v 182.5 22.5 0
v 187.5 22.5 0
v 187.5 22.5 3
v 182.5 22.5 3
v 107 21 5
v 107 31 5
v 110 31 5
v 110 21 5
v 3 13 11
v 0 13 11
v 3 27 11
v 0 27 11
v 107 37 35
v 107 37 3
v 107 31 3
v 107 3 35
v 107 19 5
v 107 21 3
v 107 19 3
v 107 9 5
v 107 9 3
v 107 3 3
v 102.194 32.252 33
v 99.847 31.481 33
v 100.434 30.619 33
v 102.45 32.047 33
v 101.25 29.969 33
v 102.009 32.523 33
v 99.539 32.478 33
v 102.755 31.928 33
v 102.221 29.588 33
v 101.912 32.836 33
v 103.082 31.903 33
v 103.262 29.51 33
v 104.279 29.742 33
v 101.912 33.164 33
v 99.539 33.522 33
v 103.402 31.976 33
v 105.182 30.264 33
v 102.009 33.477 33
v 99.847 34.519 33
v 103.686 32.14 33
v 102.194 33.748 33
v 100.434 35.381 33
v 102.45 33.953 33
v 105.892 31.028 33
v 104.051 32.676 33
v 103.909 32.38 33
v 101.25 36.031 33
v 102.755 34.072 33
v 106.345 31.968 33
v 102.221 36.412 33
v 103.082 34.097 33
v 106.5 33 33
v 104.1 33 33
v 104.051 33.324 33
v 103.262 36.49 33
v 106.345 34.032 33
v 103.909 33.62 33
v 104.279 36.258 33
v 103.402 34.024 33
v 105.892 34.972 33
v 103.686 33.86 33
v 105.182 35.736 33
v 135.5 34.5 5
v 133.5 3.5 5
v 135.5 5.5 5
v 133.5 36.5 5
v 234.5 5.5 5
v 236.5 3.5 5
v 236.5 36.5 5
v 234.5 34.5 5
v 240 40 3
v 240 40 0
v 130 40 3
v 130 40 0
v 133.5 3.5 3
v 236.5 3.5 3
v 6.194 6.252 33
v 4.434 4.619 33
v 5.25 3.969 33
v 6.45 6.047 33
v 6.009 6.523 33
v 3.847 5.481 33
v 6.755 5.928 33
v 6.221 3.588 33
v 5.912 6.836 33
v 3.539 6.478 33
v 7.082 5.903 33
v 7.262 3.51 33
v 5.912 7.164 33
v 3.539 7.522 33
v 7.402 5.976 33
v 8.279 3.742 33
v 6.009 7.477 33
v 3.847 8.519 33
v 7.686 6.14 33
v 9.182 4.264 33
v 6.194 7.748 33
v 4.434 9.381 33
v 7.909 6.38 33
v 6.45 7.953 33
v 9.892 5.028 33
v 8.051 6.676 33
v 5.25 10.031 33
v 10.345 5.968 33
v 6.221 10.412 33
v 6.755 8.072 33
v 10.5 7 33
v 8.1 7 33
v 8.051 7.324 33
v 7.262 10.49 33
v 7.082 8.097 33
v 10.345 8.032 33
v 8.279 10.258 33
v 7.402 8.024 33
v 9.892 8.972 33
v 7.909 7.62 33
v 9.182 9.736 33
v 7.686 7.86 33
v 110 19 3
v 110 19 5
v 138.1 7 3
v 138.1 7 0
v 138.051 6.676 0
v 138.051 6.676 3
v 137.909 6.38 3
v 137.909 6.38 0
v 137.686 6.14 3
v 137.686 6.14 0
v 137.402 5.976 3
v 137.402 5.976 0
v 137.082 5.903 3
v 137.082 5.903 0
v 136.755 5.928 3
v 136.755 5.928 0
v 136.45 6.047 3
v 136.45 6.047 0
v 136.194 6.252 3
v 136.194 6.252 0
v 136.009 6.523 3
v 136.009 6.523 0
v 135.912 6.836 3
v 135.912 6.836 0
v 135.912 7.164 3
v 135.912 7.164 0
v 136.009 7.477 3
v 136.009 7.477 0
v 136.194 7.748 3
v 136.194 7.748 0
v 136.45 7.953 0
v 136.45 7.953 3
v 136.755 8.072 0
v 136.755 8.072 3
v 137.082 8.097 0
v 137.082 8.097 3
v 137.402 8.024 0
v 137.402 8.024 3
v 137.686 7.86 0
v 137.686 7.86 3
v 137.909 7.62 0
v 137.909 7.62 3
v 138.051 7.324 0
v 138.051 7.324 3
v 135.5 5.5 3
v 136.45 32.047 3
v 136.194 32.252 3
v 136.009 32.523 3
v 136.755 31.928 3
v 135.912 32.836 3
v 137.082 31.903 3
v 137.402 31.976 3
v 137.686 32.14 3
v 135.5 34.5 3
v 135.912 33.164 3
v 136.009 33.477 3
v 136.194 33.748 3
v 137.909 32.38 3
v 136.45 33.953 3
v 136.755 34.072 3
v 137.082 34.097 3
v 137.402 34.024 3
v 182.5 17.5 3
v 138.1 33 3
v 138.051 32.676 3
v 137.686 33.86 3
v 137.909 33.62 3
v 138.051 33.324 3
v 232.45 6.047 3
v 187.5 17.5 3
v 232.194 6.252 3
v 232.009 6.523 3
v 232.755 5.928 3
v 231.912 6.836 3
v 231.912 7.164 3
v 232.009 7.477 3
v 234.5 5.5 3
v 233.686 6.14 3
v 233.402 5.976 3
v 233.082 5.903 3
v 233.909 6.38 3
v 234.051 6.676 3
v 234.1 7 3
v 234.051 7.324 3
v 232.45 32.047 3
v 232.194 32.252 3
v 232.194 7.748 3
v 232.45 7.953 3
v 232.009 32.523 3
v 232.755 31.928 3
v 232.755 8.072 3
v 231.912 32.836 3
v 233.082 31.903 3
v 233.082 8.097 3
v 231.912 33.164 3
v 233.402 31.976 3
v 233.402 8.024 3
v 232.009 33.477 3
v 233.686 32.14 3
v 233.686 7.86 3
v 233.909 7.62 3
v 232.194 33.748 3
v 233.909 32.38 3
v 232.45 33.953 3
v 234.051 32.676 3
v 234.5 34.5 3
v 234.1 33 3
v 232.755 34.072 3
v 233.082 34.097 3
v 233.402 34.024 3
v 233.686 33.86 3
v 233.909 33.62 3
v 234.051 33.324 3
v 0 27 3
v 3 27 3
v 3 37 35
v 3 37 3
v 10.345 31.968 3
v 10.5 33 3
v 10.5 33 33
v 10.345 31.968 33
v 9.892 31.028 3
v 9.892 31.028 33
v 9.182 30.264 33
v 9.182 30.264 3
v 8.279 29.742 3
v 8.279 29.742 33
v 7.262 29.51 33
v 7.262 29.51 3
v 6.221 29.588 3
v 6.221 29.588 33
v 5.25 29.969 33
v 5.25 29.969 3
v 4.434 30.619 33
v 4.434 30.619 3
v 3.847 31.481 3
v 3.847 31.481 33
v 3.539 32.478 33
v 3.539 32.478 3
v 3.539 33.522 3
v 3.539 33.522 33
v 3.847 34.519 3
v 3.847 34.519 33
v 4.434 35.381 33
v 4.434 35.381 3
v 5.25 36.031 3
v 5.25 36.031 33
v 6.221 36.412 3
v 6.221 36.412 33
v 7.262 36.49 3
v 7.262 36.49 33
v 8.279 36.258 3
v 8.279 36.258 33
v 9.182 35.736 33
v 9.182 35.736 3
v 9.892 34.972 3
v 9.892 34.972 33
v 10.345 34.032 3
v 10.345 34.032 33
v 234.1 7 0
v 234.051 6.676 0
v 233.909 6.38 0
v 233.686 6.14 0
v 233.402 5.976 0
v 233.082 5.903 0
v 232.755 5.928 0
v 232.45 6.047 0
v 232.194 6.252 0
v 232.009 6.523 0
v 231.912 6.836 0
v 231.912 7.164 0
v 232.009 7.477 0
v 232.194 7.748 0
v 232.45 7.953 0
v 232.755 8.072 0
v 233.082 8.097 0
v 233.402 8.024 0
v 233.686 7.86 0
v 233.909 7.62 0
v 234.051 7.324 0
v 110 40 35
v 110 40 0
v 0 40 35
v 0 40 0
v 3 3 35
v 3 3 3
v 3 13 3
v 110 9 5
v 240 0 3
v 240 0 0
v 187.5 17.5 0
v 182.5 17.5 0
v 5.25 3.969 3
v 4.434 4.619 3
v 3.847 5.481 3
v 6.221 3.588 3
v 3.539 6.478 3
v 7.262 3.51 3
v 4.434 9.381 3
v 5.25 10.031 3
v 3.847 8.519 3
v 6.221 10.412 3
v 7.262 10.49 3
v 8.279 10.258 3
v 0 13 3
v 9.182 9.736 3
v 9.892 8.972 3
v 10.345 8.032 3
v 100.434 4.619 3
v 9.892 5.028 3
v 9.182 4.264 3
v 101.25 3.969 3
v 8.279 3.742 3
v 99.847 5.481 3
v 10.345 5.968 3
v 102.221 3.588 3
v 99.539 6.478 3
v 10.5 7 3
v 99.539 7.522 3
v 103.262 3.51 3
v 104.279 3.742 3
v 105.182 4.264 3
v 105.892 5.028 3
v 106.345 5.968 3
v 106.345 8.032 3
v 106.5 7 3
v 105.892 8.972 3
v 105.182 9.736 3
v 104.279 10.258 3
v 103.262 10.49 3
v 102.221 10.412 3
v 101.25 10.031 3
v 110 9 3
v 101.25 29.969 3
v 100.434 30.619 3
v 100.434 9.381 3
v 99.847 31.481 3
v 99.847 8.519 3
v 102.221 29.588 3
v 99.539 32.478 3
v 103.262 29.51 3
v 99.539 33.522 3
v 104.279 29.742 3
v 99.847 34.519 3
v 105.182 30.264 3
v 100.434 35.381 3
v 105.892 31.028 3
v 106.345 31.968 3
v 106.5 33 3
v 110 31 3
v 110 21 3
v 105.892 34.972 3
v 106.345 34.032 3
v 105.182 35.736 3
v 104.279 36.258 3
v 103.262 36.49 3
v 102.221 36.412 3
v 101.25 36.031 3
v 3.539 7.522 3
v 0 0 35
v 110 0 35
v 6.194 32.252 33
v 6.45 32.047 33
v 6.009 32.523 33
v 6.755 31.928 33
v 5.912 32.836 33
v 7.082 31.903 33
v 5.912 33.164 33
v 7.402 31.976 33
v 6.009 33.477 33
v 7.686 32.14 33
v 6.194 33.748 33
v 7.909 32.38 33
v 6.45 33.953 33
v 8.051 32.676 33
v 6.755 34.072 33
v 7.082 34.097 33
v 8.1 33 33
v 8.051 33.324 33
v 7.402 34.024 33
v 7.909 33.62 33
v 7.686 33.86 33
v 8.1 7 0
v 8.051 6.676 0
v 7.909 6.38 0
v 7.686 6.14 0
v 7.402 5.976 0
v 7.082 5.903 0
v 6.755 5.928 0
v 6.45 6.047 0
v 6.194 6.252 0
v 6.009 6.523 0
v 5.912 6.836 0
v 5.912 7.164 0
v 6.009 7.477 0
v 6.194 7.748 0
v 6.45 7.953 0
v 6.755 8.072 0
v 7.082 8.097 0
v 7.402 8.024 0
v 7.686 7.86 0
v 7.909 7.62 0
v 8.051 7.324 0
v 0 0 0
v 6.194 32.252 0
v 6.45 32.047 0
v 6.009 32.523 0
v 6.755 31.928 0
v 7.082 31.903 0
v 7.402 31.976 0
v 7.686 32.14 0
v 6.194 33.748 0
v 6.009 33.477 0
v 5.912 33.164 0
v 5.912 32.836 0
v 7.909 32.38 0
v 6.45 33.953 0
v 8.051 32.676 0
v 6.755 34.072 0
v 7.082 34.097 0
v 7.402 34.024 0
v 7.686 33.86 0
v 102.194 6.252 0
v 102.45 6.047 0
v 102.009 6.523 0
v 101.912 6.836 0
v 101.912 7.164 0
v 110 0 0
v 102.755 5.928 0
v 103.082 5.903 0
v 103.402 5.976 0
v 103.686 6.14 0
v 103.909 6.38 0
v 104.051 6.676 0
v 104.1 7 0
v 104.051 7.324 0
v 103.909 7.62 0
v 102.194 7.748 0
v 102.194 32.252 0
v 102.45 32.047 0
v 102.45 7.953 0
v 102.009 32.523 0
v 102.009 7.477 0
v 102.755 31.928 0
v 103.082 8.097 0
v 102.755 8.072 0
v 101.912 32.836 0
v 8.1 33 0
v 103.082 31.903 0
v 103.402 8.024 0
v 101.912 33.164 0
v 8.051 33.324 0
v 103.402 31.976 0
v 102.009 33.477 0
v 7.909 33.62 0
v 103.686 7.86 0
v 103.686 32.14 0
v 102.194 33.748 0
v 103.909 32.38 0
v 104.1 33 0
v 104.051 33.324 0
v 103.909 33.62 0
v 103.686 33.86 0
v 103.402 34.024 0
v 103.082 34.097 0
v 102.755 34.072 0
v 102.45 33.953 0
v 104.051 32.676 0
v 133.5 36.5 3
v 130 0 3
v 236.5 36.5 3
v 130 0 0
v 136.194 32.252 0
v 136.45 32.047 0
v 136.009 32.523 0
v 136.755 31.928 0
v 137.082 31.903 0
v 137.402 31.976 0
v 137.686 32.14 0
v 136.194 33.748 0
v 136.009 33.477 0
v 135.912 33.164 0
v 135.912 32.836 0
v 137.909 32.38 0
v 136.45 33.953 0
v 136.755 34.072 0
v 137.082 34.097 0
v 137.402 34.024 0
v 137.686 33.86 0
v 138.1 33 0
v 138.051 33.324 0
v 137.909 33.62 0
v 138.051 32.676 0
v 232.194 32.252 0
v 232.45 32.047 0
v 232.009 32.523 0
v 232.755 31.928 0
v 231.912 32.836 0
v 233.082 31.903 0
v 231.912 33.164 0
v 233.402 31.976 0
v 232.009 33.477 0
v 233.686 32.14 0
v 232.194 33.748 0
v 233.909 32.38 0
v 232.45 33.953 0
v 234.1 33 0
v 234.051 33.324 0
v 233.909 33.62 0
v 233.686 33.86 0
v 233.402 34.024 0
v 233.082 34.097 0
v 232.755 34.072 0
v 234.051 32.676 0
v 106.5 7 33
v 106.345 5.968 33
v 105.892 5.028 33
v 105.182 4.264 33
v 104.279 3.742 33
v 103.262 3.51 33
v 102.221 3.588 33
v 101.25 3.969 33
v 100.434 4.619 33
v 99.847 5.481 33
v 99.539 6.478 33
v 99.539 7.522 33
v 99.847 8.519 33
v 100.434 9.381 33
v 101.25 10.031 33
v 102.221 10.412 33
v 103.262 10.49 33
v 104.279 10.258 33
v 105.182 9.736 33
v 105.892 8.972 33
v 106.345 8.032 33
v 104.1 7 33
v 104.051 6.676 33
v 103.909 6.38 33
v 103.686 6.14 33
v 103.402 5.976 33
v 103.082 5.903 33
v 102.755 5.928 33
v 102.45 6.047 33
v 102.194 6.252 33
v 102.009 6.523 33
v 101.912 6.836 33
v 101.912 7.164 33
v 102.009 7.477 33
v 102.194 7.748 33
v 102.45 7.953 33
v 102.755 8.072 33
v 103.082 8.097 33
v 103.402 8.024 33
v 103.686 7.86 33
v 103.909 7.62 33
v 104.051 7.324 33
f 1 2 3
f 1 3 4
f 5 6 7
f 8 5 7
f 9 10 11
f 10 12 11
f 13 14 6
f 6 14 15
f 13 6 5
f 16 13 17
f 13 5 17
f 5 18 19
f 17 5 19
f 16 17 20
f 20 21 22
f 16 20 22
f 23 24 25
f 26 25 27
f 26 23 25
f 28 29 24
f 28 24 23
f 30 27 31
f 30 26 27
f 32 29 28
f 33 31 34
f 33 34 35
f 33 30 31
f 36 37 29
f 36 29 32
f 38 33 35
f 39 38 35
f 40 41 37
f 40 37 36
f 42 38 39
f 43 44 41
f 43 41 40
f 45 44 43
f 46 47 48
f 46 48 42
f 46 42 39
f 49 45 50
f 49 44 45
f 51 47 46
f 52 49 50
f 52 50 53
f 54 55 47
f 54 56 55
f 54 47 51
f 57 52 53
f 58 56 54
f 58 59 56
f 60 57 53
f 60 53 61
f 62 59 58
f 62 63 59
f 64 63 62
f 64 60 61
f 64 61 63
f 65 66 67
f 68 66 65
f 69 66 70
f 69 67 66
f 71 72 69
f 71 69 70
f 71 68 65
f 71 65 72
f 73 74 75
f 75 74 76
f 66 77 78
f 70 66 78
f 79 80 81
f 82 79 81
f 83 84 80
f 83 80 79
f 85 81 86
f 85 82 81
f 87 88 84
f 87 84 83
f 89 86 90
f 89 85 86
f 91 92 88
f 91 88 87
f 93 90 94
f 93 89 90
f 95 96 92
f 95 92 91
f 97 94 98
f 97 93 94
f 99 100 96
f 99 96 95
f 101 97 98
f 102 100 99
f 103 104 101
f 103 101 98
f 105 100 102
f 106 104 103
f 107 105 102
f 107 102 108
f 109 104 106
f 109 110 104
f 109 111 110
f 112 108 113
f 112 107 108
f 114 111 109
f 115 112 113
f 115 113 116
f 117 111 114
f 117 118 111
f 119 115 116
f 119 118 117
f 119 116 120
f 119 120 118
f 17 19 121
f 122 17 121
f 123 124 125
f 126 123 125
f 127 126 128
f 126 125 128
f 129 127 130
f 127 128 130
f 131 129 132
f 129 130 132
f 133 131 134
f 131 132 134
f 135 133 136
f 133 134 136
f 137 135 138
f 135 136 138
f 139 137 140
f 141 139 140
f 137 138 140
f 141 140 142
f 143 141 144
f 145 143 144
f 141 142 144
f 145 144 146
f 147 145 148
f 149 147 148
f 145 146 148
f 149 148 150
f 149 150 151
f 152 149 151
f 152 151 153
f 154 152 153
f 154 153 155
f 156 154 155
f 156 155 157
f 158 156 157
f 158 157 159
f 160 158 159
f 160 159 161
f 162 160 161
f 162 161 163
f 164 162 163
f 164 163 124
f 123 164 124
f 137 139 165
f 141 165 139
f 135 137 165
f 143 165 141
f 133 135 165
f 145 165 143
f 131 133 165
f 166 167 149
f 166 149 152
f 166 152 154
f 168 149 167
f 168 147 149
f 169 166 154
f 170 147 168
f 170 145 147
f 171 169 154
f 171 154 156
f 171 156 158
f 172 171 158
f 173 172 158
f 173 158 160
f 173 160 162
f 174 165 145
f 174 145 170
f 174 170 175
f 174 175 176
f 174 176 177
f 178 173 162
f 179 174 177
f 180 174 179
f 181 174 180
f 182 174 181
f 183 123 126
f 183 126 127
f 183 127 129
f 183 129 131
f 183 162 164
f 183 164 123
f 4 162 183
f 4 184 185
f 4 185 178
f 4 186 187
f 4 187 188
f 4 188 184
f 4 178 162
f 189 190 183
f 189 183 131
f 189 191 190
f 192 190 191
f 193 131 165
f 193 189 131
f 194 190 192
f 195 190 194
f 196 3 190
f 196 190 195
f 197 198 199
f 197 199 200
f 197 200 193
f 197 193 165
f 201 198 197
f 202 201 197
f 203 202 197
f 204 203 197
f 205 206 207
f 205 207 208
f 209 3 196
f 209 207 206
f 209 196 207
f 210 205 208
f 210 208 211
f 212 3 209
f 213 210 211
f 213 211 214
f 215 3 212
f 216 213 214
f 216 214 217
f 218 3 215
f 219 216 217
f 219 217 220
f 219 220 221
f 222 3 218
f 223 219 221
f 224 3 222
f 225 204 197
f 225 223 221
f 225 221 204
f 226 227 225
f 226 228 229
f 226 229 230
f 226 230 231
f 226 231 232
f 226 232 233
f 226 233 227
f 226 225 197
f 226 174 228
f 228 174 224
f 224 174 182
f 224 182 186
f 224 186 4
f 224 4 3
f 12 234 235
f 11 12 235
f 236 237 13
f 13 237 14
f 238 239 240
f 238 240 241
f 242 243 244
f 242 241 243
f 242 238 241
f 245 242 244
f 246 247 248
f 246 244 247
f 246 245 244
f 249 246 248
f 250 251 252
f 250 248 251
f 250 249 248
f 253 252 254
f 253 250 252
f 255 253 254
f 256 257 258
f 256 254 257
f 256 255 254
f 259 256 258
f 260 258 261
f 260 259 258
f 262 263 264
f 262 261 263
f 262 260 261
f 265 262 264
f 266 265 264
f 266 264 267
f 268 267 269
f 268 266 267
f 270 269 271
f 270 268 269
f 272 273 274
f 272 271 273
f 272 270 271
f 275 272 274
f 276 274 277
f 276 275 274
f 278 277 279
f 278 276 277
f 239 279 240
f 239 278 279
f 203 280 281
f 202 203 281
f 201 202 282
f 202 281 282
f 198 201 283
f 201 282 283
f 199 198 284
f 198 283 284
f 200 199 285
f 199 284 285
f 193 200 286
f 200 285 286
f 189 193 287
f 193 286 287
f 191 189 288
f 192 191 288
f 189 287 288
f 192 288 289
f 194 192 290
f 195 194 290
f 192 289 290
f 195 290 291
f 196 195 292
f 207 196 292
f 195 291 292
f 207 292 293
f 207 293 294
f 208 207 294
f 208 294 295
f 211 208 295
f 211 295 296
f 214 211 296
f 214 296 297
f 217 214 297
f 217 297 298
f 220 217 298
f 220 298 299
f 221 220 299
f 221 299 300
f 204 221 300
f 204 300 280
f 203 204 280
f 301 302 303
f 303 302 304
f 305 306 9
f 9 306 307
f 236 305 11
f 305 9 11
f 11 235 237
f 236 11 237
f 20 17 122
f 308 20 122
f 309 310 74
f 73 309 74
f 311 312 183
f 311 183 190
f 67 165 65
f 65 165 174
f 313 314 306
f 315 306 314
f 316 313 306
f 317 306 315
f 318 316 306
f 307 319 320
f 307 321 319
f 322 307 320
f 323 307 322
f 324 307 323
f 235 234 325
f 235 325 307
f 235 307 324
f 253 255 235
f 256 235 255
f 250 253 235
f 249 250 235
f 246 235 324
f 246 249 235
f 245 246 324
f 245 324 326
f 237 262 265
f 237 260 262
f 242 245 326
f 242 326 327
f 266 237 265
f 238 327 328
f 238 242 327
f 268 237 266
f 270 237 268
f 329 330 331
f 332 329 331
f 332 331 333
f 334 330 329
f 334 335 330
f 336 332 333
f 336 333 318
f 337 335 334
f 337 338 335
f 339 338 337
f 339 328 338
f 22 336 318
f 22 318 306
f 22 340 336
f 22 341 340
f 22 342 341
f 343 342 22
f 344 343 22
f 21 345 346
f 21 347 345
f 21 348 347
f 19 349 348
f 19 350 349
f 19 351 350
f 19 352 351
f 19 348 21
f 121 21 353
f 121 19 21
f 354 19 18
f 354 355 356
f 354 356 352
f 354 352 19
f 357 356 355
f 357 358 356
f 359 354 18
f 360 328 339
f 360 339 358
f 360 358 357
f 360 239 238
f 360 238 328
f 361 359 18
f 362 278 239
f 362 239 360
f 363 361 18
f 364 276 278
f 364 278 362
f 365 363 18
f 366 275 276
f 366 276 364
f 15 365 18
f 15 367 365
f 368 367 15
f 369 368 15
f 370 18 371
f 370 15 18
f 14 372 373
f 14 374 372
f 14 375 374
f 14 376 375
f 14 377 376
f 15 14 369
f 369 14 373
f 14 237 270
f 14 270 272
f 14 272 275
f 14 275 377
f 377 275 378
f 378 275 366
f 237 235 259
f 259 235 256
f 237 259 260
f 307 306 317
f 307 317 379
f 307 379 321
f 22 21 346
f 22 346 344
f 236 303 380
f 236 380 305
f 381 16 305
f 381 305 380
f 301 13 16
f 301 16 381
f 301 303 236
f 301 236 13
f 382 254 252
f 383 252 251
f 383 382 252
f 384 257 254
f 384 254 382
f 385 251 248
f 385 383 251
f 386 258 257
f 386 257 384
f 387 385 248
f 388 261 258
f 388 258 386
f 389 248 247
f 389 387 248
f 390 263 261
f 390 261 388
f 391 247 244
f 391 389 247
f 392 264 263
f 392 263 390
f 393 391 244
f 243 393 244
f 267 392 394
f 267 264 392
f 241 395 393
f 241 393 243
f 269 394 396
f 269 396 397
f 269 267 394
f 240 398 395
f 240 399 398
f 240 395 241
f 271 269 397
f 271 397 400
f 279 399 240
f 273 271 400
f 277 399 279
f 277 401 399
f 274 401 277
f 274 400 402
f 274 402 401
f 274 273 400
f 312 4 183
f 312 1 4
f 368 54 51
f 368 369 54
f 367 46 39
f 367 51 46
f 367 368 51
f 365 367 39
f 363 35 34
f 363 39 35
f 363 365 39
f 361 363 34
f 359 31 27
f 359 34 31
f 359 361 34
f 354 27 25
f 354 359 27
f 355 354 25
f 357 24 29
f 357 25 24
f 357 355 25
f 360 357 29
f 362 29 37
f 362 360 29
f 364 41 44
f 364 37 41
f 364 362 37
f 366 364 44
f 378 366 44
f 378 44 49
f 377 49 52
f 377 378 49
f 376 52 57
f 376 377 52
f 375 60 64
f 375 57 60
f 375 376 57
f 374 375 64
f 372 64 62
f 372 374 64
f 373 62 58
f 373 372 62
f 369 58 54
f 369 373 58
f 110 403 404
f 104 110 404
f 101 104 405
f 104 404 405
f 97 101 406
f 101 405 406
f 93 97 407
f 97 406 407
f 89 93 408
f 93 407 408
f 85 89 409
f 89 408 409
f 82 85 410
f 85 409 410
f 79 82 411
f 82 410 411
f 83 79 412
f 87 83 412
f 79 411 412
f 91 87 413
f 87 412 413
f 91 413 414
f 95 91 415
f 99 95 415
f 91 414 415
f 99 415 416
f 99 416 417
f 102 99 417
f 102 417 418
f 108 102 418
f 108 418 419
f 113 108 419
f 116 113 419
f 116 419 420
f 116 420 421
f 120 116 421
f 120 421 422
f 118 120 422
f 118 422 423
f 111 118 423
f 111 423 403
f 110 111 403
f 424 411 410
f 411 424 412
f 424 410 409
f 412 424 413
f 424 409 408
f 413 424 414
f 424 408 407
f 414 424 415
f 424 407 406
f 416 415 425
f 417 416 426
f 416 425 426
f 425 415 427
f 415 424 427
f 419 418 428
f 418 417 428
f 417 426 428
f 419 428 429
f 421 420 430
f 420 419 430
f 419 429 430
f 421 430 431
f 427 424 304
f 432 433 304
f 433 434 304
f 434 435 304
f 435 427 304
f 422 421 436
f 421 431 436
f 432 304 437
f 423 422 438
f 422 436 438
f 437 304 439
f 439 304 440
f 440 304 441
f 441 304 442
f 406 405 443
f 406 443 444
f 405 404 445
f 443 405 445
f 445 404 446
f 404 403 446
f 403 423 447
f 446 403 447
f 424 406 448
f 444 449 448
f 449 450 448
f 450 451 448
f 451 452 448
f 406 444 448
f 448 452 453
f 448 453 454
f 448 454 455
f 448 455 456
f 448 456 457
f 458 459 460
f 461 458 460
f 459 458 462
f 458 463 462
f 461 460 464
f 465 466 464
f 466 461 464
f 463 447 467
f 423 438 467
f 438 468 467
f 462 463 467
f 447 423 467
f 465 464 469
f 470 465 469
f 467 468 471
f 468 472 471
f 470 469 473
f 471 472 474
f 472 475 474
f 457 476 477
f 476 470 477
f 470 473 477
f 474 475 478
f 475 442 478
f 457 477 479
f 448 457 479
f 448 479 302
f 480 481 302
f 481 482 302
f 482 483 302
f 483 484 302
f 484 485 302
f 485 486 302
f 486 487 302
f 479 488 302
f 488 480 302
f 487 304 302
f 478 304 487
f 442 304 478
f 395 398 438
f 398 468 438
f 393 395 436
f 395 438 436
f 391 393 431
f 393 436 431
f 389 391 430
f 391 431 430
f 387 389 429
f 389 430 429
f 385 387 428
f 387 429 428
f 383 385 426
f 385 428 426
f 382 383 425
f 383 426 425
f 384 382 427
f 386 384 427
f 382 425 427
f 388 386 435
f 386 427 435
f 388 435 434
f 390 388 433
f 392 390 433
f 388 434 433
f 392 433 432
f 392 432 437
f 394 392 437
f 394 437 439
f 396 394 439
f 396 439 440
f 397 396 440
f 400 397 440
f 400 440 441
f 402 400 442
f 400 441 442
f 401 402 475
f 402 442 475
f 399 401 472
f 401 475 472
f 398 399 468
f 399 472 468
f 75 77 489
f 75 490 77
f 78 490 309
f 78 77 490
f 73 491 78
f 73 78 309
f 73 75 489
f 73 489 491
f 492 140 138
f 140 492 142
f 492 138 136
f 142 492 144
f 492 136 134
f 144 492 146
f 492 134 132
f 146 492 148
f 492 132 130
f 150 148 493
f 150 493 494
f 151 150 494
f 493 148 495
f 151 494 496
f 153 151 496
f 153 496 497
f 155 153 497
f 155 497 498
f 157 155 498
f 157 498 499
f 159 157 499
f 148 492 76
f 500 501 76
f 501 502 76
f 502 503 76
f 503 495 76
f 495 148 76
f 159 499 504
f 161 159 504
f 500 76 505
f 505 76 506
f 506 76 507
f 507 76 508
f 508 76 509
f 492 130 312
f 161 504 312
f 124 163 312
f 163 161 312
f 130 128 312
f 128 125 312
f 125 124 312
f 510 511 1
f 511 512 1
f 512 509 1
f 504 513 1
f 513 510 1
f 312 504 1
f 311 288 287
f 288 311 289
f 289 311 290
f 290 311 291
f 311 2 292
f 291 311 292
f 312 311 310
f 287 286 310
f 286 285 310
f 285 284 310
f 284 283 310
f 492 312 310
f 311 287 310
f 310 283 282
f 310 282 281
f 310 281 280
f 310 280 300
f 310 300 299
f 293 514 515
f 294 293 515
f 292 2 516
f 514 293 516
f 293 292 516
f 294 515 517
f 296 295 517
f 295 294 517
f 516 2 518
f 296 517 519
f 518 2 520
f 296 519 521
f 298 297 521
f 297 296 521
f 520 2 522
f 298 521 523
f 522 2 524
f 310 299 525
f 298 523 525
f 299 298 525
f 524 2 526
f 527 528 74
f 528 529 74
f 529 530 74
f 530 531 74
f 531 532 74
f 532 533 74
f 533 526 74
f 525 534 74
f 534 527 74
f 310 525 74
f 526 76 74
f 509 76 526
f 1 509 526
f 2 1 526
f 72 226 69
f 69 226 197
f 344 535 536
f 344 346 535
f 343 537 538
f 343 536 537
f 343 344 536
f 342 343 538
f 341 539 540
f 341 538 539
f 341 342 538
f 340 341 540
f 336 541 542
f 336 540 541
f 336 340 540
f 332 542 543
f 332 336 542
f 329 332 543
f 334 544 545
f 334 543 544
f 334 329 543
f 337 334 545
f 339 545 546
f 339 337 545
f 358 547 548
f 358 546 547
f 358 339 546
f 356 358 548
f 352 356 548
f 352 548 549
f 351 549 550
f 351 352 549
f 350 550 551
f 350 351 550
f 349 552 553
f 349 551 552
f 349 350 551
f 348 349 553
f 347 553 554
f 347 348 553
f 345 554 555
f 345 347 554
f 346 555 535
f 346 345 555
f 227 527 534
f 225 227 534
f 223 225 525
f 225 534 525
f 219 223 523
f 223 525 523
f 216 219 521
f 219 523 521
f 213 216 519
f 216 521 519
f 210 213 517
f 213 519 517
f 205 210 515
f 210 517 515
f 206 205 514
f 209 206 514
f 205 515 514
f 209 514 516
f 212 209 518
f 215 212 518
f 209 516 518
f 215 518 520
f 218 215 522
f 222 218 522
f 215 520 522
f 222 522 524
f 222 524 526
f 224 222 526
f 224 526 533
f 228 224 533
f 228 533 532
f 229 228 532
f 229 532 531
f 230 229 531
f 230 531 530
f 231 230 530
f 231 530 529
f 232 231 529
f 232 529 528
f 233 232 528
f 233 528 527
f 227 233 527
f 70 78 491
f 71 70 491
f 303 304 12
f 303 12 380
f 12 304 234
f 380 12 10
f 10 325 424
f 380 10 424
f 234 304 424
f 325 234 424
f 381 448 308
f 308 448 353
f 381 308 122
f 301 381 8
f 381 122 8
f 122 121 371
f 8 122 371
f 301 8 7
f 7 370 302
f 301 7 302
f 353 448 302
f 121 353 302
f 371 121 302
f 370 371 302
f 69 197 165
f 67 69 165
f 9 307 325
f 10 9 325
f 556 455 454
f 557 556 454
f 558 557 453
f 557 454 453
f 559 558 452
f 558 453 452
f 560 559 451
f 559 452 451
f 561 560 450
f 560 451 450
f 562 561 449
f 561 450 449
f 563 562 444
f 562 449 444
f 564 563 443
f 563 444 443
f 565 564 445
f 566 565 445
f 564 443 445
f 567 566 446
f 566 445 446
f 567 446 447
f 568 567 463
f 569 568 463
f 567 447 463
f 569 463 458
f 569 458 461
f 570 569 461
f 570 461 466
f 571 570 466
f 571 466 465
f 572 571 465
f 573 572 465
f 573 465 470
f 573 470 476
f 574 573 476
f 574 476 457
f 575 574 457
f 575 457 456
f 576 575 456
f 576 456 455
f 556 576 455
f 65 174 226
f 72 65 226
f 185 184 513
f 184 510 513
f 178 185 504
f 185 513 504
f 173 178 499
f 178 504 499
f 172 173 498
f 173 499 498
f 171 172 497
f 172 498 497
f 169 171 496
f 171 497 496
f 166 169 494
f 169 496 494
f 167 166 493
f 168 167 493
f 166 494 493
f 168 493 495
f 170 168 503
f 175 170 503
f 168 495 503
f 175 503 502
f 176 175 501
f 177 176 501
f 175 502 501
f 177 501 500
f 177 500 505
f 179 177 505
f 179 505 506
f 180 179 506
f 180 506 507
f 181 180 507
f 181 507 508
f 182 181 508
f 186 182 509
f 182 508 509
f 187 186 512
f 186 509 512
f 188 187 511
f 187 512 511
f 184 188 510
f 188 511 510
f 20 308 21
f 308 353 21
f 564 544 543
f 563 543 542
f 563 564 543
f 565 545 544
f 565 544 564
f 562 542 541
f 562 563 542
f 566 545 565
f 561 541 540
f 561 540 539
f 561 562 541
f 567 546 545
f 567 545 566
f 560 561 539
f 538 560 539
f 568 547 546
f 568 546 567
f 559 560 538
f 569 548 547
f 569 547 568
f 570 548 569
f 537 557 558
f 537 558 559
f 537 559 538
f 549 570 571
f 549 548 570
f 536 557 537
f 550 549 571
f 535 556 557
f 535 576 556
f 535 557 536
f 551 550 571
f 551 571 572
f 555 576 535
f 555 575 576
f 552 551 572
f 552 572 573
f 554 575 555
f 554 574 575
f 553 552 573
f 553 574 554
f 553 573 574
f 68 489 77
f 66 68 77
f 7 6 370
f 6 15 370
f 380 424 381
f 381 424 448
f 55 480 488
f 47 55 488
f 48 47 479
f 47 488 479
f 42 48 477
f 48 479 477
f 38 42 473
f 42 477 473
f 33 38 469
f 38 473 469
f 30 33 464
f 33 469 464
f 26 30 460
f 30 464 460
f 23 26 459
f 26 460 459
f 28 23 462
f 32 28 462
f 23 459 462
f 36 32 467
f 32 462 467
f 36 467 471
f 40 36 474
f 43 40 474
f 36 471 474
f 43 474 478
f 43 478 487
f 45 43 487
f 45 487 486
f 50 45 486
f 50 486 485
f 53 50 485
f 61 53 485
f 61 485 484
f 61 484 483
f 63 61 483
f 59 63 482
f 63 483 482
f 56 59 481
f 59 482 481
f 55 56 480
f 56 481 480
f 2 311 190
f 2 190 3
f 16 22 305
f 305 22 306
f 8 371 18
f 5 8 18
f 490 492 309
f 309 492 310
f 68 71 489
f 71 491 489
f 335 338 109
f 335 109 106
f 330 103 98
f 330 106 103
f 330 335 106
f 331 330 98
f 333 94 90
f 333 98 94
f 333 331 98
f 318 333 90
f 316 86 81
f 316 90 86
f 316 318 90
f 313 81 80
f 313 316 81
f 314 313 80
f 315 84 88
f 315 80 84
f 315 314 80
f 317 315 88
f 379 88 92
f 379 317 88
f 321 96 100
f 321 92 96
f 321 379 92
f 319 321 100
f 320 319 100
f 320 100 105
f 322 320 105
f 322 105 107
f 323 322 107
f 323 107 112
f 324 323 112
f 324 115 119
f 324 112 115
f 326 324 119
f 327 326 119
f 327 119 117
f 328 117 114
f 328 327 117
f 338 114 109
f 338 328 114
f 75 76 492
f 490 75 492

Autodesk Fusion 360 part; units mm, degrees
sketch "Boceto1" plane through (0, 0, 0) normal (0, 0, 1) x (1, 0, 0)
sketch "Boceto2" plane through (0, 0, 0) normal (0, 0, 1) x (1, 0, 0)
sketch "Boceto3" plane through (0, 0, 0) normal (0, 0, 1) x (1, 0, 0)
  line L0 (0, 0) -> (110, 0)
  line L1 (110, 0) -> (110, 40)
  line L2 (110, 40) -> (0, 40)
  line L3 (0, 40) -> (0, 0)
sketch "Boceto4" plane through (0, 0, 0) normal (0, 0, 1) x (1, 0, 0)
  line L0 (0, 0) -> (110, 0)
  line L1 (110, 0) -> (110, 3)
  line L2 (110, 3) -> (0, 3)
  line L3 (0, 3) -> (0, 0)
sketch "Boceto5" plane through (0, 0, 0) normal (0, 0, 1) x (1, 0, 0)
  line L0 (0, 37) -> (110, 37)
  line L1 (110, 37) -> (110, 40)
  line L2 (110, 40) -> (0, 40)
  line L3 (0, 40) -> (0, 37)
sketch "Boceto6" plane through (0, 0, 0) normal (0, 0, 1) x (1, 0, 0)
  line L0 (0, 0) -> (3, 0)
  line L1 (3, 0) -> (3, 13)
  line L2 (3, 13) -> (0, 13)
  line L3 (0, 13) -> (0, 0)
sketch "Boceto7" plane through (0, 0, 0) normal (0, 0, 1) x (1, 0, 0)
  line L0 (0, 27) -> (3, 27)
  line L1 (3, 27) -> (3, 40)
  line L2 (3, 40) -> (0, 40)
  line L3 (0, 40) -> (0, 27)
sketch "Boceto8" plane through (0, 0, 0) normal (0, 0, 1) x (1, 0, 0)
  line L0 (0, 13) -> (3, 13)
  line L1 (3, 13) -> (3, 27)
  line L2 (3, 27) -> (0, 27)
  line L3 (0, 27) -> (0, 13)
sketch "Boceto9" plane through (0, 0, 0) normal (0, 0, 1) x (1, 0, 0)
  line L0 (107, 0) -> (110, 0)
  line L1 (110, 0) -> (110, 9)
  line L2 (110, 9) -> (107, 9)
  line L3 (107, 9) -> (107, 0)
sketch "Boceto10" plane through (0, 0, 0) normal (0, 0, 1) x (1, 0, 0)
  line L0 (107, 19) -> (110, 19)
  line L1 (110, 19) -> (110, 21)
  line L2 (110, 21) -> (107, 21)
  line L3 (107, 21) -> (107, 19)
sketch "Boceto11" plane through (0, 0, 0) normal (0, 0, 1) x (1, 0, 0)
  line L0 (107, 31) -> (110, 31)
  line L1 (110, 31) -> (110, 40)
  line L2 (110, 40) -> (107, 40)
  line L3 (107, 40) -> (107, 31)
sketch "Boceto12" plane through (0, 0, 0) normal (0, 0, 1) x (1, 0, 0)
  line L0 (107, 9) -> (110, 9)
  line L1 (110, 9) -> (110, 31)
  line L2 (110, 31) -> (107, 31)
  line L3 (107, 31) -> (107, 9)
sketch "Boceto13" plane through (0, 0, 0) normal (0, 0, 1) x (1, 0, 0)
  circle A0 centre (7, 7) radius 3.5
sketch "Boceto14" plane through (0, 0, 0) normal (0, 0, 1) x (1, 0, 0)
  circle A0 centre (7, 7) radius 1.1
sketch "Boceto15" plane through (0, 0, 0) normal (0, 0, 1) x (1, 0, 0)
  circle A0 centre (103, 7) radius 3.5
sketch "Boceto16" plane through (0, 0, 0) normal (0, 0, 1) x (1, 0, 0)
  circle A0 centre (103, 7) radius 1.1
sketch "Boceto17" plane through (0, 0, 0) normal (0, 0, 1) x (1, 0, 0)
  circle A0 centre (7, 33) radius 3.5
sketch "Boceto18" plane through (0, 0, 0) normal (0, 0, 1) x (1, 0, 0)
  circle A0 centre (7, 33) radius 1.1
sketch "Boceto19" plane through (0, 0, 0) normal (0, 0, 1) x (1, 0, 0)
  circle A0 centre (103, 33) radius 3.5
sketch "Boceto20" plane through (0, 0, 0) normal (0, 0, 1) x (1, 0, 0)
  circle A0 centre (103, 33) radius 1.1
sketch "Boceto21" plane through (0, 0, 0) normal (0, 0, 1) x (1, 0, 0)
  circle A0 centre (35, 12) radius 2.5
sketch "Boceto22" plane through (0, 0, 0) normal (0, 0, 1) x (1, 0, 0)
  circle A0 centre (35, 12) radius 1.1
sketch "Boceto23" plane through (0, 0, 0) normal (0, 0, 1) x (1, 0, 0)
  circle A0 centre (75, 12) radius 2.5
sketch "Boceto24" plane through (0, 0, 0) normal (0, 0, 1) x (1, 0, 0)
  circle A0 centre (75, 12) radius 1.1
sketch "Boceto25" plane through (0, 0, 0) normal (0, 0, 1) x (1, 0, 0)
  circle A0 centre (35, 28) radius 2.5
sketch "Boceto26" plane through (0, 0, 0) normal (0, 0, 1) x (1, 0, 0)
  circle A0 centre (35, 28) radius 1.1
sketch "Boceto27" plane through (0, 0, 0) normal (0, 0, 1) x (1, 0, 0)
  circle A0 centre (75, 28) radius 2.5
sketch "Boceto28" plane through (0, 0, 0) normal (0, 0, 1) x (1, 0, 0)
  circle A0 centre (75, 28) radius 1.1
sketch "Boceto29" plane through (0, 0, 0) normal (0, 0, 1) x (1, 0, 0)
  circle A0 centre (95, 20) radius 3
sketch "Boceto30" plane through (0, 0, 0) normal (0, 0, 1) x (1, 0, 0)
  circle A0 centre (95, 20) radius 1.6
sketch "Boceto31" plane through (0, 0, 0) normal (0, 0, 1) x (1, 0, 0)
  circle A0 centre (53, 20) radius 2.5
sketch "Boceto32" plane through (0, 0, 0) normal (0, 0, 1) x (1, 0, 0)
  circle A0 centre (53, 20) radius 1.1
sketch "Boceto33" plane through (0, 0, 0) normal (0, 0, 1) x (1, 0, 0)
  circle A0 centre (57, 20) radius 2.5
sketch "Boceto34" plane through (0, 0, 0) normal (0, 0, 1) x (1, 0, 0)
  circle A0 centre (57, 20) radius 1.1
sketch "Boceto35" plane through (0, 0, 0) normal (0, 0, 1) x (1, 0, 0)
  line L0 (130, 0) -> (240, 0)
  line L1 (240, 0) -> (240, 40)
  line L2 (240, 40) -> (130, 40)
  line L3 (130, 40) -> (130, 0)
sketch "Boceto36" plane through (0, 0, 0) normal (0, 0, 1) x (1, 0, 0)
  line L0 (133.5, 3.5) -> (236.5, 3.5)
  line L1 (236.5, 3.5) -> (236.5, 5.5)
  line L2 (236.5, 5.5) -> (133.5, 5.5)
  line L3 (133.5, 5.5) -> (133.5, 3.5)
sketch "Boceto37" plane through (0, 0, 0) normal (0, 0, 1) x (1, 0, 0)
  line L0 (133.5, 34.5) -> (236.5, 34.5)
  line L1 (236.5, 34.5) -> (236.5, 36.5)
  line L2 (236.5, 36.5) -> (133.5, 36.5)
  line L3 (133.5, 36.5) -> (133.5, 34.5)
sketch "Boceto38" plane through (0, 0, 0) normal (0, 0, 1) x (1, 0, 0)
  line L0 (133.5, 3.5) -> (135.5, 3.5)
  line L1 (135.5, 3.5) -> (135.5, 36.5)
  line L2 (135.5, 36.5) -> (133.5, 36.5)
  line L3 (133.5, 36.5) -> (133.5, 3.5)
sketch "Boceto39" plane through (0, 0, 0) normal (0, 0, 1) x (1, 0, 0)
  line L0 (234.5, 3.5) -> (236.5, 3.5)
  line L1 (236.5, 3.5) -> (236.5, 36.5)
  line L2 (236.5, 36.5) -> (234.5, 36.5)
  line L3 (234.5, 36.5) -> (234.5, 3.5)
sketch "Boceto40" plane through (0, 0, 0) normal (0, 0, 1) x (1, 0, 0)
  line L0 (182.5, 17.5) -> (187.5, 17.5)
  line L1 (187.5, 17.5) -> (187.5, 22.5)
  line L2 (187.5, 22.5) -> (182.5, 22.5)
  line L3 (182.5, 22.5) -> (182.5, 17.5)
sketch "Boceto41" plane through (0, 0, 0) normal (0, 0, 1) x (1, 0, 0)
  circle A0 centre (137, 7) radius 1.1
sketch "Boceto42" plane through (0, 0, 0) normal (0, 0, 1) x (1, 0, 0)
  circle A0 centre (233, 7) radius 1.1
sketch "Boceto43" plane through (0, 0, 0) normal (0, 0, 1) x (1, 0, 0)
  circle A0 centre (137, 33) radius 1.1
sketch "Boceto44" plane through (0, 0, 0) normal (0, 0, 1) x (1, 0, 0)
  circle A0 centre (233, 33) radius 1.1
sketch "Boceto45" plane through (0, 0, 0) normal (0, 0, 1) x (1, 0, 0)
  line L0 (0, 0) -> (110, 0)
  line L1 (110, 0) -> (110, 40)
  line L2 (110, 40) -> (0, 40)
  line L3 (0, 40) -> (0, 0)
sketch "Boceto46" plane through (0, 0, 0) normal (0, 0, 1) x (1, 0, 0)
  line L0 (0, 0) -> (110, 0)
  line L1 (110, 0) -> (110, 3)
  line L2 (110, 3) -> (0, 3)
  line L3 (0, 3) -> (0, 0)
sketch "Boceto47" plane through (0, 0, 0) normal (0, 0, 1) x (1, 0, 0)
  line L0 (0, 37) -> (110, 37)
  line L1 (110, 37) -> (110, 40)
  line L2 (110, 40) -> (0, 40)
  line L3 (0, 40) -> (0, 37)
sketch "Boceto48" plane through (0, 0, 0) normal (0, 0, 1) x (1, 0, 0)
  line L0 (0, 0) -> (3, 0)
  line L1 (3, 0) -> (3, 13)
  line L2 (3, 13) -> (0, 13)
  line L3 (0, 13) -> (0, 0)
sketch "Boceto49" plane through (0, 0, 0) normal (0, 0, 1) x (1, 0, 0)
  line L0 (0, 27) -> (3, 27)
  line L1 (3, 27) -> (3, 40)
  line L2 (3, 40) -> (0, 40)
  line L3 (0, 40) -> (0, 27)
sketch "Boceto50" plane through (0, 0, 0) normal (0, 0, 1) x (1, 0, 0)
  line L0 (0, 13) -> (3, 13)
  line L1 (3, 13) -> (3, 27)
  line L2 (3, 27) -> (0, 27)
  line L3 (0, 27) -> (0, 13)
sketch "Boceto51" plane through (0, 0, 0) normal (0, 0, 1) x (1, 0, 0)
  line L0 (107, 0) -> (110, 0)
  line L1 (110, 0) -> (110, 9)
  line L2 (110, 9) -> (107, 9)
  line L3 (107, 9) -> (107, 0)
sketch "Boceto52" plane through (0, 0, 0) normal (0, 0, 1) x (1, 0, 0)
  line L0 (107, 19) -> (110, 19)
  line L1 (110, 19) -> (110, 21)
  line L2 (110, 21) -> (107, 21)
  line L3 (107, 21) -> (107, 19)
sketch "Boceto53" plane through (0, 0, 0) normal (0, 0, 1) x (1, 0, 0)
  line L0 (107, 31) -> (110, 31)
  line L1 (110, 31) -> (110, 40)
  line L2 (110, 40) -> (107, 40)
  line L3 (107, 40) -> (107, 31)
sketch "Boceto54" plane through (0, 0, 0) normal (0, 0, 1) x (1, 0, 0)
  line L0 (107, 9) -> (110, 9)
  line L1 (110, 9) -> (110, 31)
  line L2 (110, 31) -> (107, 31)
  line L3 (107, 31) -> (107, 9)
sketch "Boceto55" plane through (0, 0, 0) normal (0, 0, 1) x (1, 0, 0)
  circle A0 centre (7, 7) radius 3.5
sketch "Boceto56" plane through (0, 0, 0) normal (0, 0, 1) x (1, 0, 0)
  circle A0 centre (7, 7) radius 1.1
sketch "Boceto57" plane through (0, 0, 0) normal (0, 0, 1) x (1, 0, 0)
  circle A0 centre (103, 7) radius 3.5
sketch "Boceto58" plane through (0, 0, 0) normal (0, 0, 1) x (1, 0, 0)
  circle A0 centre (103, 7) radius 1.1
sketch "Boceto59" plane through (0, 0, 0) normal (0, 0, 1) x (1, 0, 0)
  circle A0 centre (7, 33) radius 3.5
sketch "Boceto60" plane through (0, 0, 0) normal (0, 0, 1) x (1, 0, 0)
  circle A0 centre (7, 33) radius 1.1
sketch "Boceto61" plane through (0, 0, 0) normal (0, 0, 1) x (1, 0, 0)
  circle A0 centre (103, 33) radius 3.5
sketch "Boceto62" plane through (0, 0, 0) normal (0, 0, 1) x (1, 0, 0)
  circle A0 centre (103, 33) radius 1.1
sketch "Boceto63" plane through (0, 0, 0) normal (0, 0, 1) x (1, 0, 0)
  line L0 (130, 0) -> (240, 0)
  line L1 (240, 0) -> (240, 40)
  line L2 (240, 40) -> (130, 40)
  line L3 (130, 40) -> (130, 0)
sketch "Boceto64" plane through (0, 0, 0) normal (0, 0, 1) x (1, 0, 0)
  line L0 (133.5, 3.5) -> (236.5, 3.5)
  line L1 (236.5, 3.5) -> (236.5, 5.5)
  line L2 (236.5, 5.5) -> (133.5, 5.5)
  line L3 (133.5, 5.5) -> (133.5, 3.5)
sketch "Boceto65" plane through (0, 0, 0) normal (0, 0, 1) x (1, 0, 0)
  line L0 (133.5, 34.5) -> (236.5, 34.5)
  line L1 (236.5, 34.5) -> (236.5, 36.5)
  line L2 (236.5, 36.5) -> (133.5, 36.5)
  line L3 (133.5, 36.5) -> (133.5, 34.5)
sketch "Boceto66" plane through (0, 0, 0) normal (0, 0, 1) x (1, 0, 0)
  line L0 (133.5, 3.5) -> (135.5, 3.5)
  line L1 (135.5, 3.5) -> (135.5, 36.5)
  line L2 (135.5, 36.5) -> (133.5, 36.5)
  line L3 (133.5, 36.5) -> (133.5, 3.5)
sketch "Boceto67" plane through (0, 0, 0) normal (0, 0, 1) x (1, 0, 0)
  line L0 (234.5, 3.5) -> (236.5, 3.5)
  line L1 (236.5, 3.5) -> (236.5, 36.5)
  line L2 (236.5, 36.5) -> (234.5, 36.5)
  line L3 (234.5, 36.5) -> (234.5, 3.5)
sketch "Boceto68" plane through (0, 0, 0) normal (0, 0, 1) x (1, 0, 0)
  line L0 (182.5, 17.5) -> (187.5, 17.5)
  line L1 (187.5, 17.5) -> (187.5, 22.5)
  line L2 (187.5, 22.5) -> (182.5, 22.5)
  line L3 (182.5, 22.5) -> (182.5, 17.5)
sketch "Boceto69" plane through (0, 0, 0) normal (0, 0, 1) x (1, 0, 0)
  circle A0 centre (137, 7) radius 1.1
sketch "Boceto70" plane through (0, 0, 0) normal (0, 0, 1) x (1, 0, 0)
  circle A0 centre (233, 7) radius 1.1
sketch "Boceto71" plane through (0, 0, 0) normal (0, 0, 1) x (1, 0, 0)
  circle A0 centre (137, 33) radius 1.1
sketch "Boceto72" plane through (0, 0, 0) normal (0, 0, 1) x (1, 0, 0)
  circle A0 centre (233, 33) radius 1.1
sketch "Boceto73" plane through (0, 0, 0) normal (0, 0, 1) x (1, 0, 0)
  line L0 (0, 0) -> (110, 0)
  line L1 (110, 0) -> (110, 40)
  line L2 (110, 40) -> (0, 40)
  line L3 (0, 40) -> (0, 0)
extrude "Extruir71" add sketch "Boceto73" along normal blind 3 makes body 1
sketch "Boceto74" plane through (0, 0, 0) normal (0, 0, 1) x (1, 0, 0)
  line L0 (0, 0) -> (110, 0)
  line L1 (110, 0) -> (110, 3)
  line L2 (110, 3) -> (0, 3)
  line L3 (0, 3) -> (0, 0)
extrude "Extruir72" add sketch "Boceto74" along normal blind 32 separate body makes body 2
move_body "Desplazar42" bodies 2 to x (1, 0, 0) y (0, 1, 0) z (0, 0, 1) at (0, 0, 3)
sketch "Boceto75" plane through (0, 0, 0) normal (0, 0, 1) x (1, 0, 0)
  line L0 (0, 37) -> (110, 37)
  line L1 (110, 37) -> (110, 40)
  line L2 (110, 40) -> (0, 40)
  line L3 (0, 40) -> (0, 37)
extrude "Extruir73" add sketch "Boceto75" along normal blind 32 separate body makes body 3
move_body "Desplazar43" bodies 3 to x (1, 0, 0) y (0, 1, 0) z (0, 0, 1) at (0, 0, 3)
sketch "Boceto76" plane through (0, 0, 0) normal (0, 0, 1) x (1, 0, 0)
  line L0 (0, 0) -> (3, 0)
  line L1 (3, 0) -> (3, 13)
  line L2 (3, 13) -> (0, 13)
  line L3 (0, 13) -> (0, 0)
extrude "Extruir74" add sketch "Boceto76" along normal blind 32 separate body makes body 4
move_body "Desplazar44" bodies 4 to x (1, 0, 0) y (0, 1, 0) z (0, 0, 1) at (0, 0, 3)
sketch "Boceto77" plane through (0, 0, 0) normal (0, 0, 1) x (1, 0, 0)
  line L0 (0, 27) -> (3, 27)
  line L1 (3, 27) -> (3, 40)
  line L2 (3, 40) -> (0, 40)
  line L3 (0, 40) -> (0, 27)
extrude "Extruir75" add sketch "Boceto77" along normal blind 32 separate body makes body 5
move_body "Desplazar45" bodies 5 to x (1, 0, 0) y (0, 1, 0) z (0, 0, 1) at (0, 0, 3)
sketch "Boceto78" plane through (0, 0, 0) normal (0, 0, 1) x (1, 0, 0)
  line L0 (0, 13) -> (3, 13)
  line L1 (3, 13) -> (3, 27)
  line L2 (3, 27) -> (0, 27)
  line L3 (0, 27) -> (0, 13)
extrude "Extruir76" add sketch "Boceto78" along normal blind 24 separate body makes body 6
move_body "Desplazar46" bodies 6 to x (1, 0, 0) y (0, 1, 0) z (0, 0, 1) at (0, 0, 11)
sketch "Boceto79" plane through (0, 0, 0) normal (0, 0, 1) x (1, 0, 0)
  line L0 (107, 0) -> (110, 0)
  line L1 (110, 0) -> (110, 9)
  line L2 (110, 9) -> (107, 9)
  line L3 (107, 9) -> (107, 0)
extrude "Extruir77" add sketch "Boceto79" along normal blind 32 separate body makes body 7
move_body "Desplazar47" bodies 7 to x (1, 0, 0) y (0, 1, 0) z (0, 0, 1) at (0, 0, 3)
sketch "Boceto80" plane through (0, 0, 0) normal (0, 0, 1) x (1, 0, 0)
  line L0 (107, 19) -> (110, 19)
  line L1 (110, 19) -> (110, 21)
  line L2 (110, 21) -> (107, 21)
  line L3 (107, 21) -> (107, 19)
extrude "Extruir78" add sketch "Boceto80" along normal blind 2 separate body makes body 8
move_body "Desplazar48" bodies 8 to x (1, 0, 0) y (0, 1, 0) z (0, 0, 1) at (0, 0, 3)
sketch "Boceto81" plane through (0, 0, 0) normal (0, 0, 1) x (1, 0, 0)
  line L0 (107, 31) -> (110, 31)
  line L1 (110, 31) -> (110, 40)
  line L2 (110, 40) -> (107, 40)
  line L3 (107, 40) -> (107, 31)
extrude "Extruir79" add sketch "Boceto81" along normal blind 32 separate body makes body 9
move_body "Desplazar49" bodies 9 to x (1, 0, 0) y (0, 1, 0) z (0, 0, 1) at (0, 0, 3)
sketch "Boceto82" plane through (0, 0, 0) normal (0, 0, 1) x (1, 0, 0)
  line L0 (107, 9) -> (110, 9)
  line L1 (110, 9) -> (110, 31)
  line L2 (110, 31) -> (107, 31)
  line L3 (107, 31) -> (107, 9)
extrude "Extruir80" add sketch "Boceto82" along normal blind 30 separate body makes body 10
move_body "Desplazar50" bodies 10 to x (1, 0, 0) y (0, 1, 0) z (0, 0, 1) at (0, 0, 5)
sketch "Boceto83" plane through (0, 0, 0) normal (0, 0, 1) x (1, 0, 0)
  circle A0 centre (7, 7) radius 3.5
extrude "Extruir81" add sketch "Boceto83" along normal blind 30 separate body makes body 11
move_body "Desplazar51" bodies 11 to x (1, 0, 0) y (0, 1, 0) z (0, 0, 1) at (0, 0, 3)
sketch "Boceto84" plane through (0, 0, 0) normal (0, 0, 1) x (1, 0, 0)
  circle A0 centre (7, 7) radius 1.1
extrude "Extruir82" cut sketch "Boceto84" along normal blind 37 bodies 1 11
sketch "Boceto85" plane through (0, 0, 0) normal (0, 0, 1) x (1, 0, 0)
  circle A0 centre (103, 7) radius 3.5
extrude "Extruir83" add sketch "Boceto85" along normal blind 30 separate body makes body 12
move_body "Desplazar52" bodies 12 to x (1, 0, 0) y (0, 1, 0) z (0, 0, 1) at (0, 0, 3)
sketch "Boceto86" plane through (0, 0, 0) normal (0, 0, 1) x (1, 0, 0)
  circle A0 centre (103, 7) radius 1.1
extrude "Extruir84" cut sketch "Boceto86" along normal blind 37 bodies 1 12
sketch "Boceto87" plane through (0, 0, 0) normal (0, 0, 1) x (1, 0, 0)
  circle A0 centre (7, 33) radius 3.5
extrude "Extruir85" add sketch "Boceto87" along normal blind 30 separate body makes body 13
move_body "Desplazar53" bodies 13 to x (1, 0, 0) y (0, 1, 0) z (0, 0, 1) at (0, 0, 3)
sketch "Boceto88" plane through (0, 0, 0) normal (0, 0, 1) x (1, 0, 0)
  circle A0 centre (7, 33) radius 1.1
extrude "Extruir86" cut sketch "Boceto88" along normal blind 37 bodies 1 13
sketch "Boceto89" plane through (0, 0, 0) normal (0, 0, 1) x (1, 0, 0)
  circle A0 centre (103, 33) radius 3.5
extrude "Extruir87" add sketch "Boceto89" along normal blind 30 separate body makes body 14
move_body "Desplazar54" bodies 14 to x (1, 0, 0) y (0, 1, 0) z (0, 0, 1) at (0, 0, 3)
sketch "Boceto90" plane through (0, 0, 0) normal (0, 0, 1) x (1, 0, 0)
  circle A0 centre (103, 33) radius 1.1
extrude "Extruir88" cut sketch "Boceto90" along normal blind 37 bodies 1 14
sketch "Boceto91" plane through (0, 0, 0) normal (0, 0, 1) x (1, 0, 0)
  line L0 (130, 0) -> (240, 0)
  line L1 (240, 0) -> (240, 40)
  line L2 (240, 40) -> (130, 40)
  line L3 (130, 40) -> (130, 0)
extrude "Extruir89" add sketch "Boceto91" along normal blind 3 separate body makes body 15
sketch "Boceto92" plane through (0, 0, 0) normal (0, 0, 1) x (1, 0, 0)
  line L0 (133.5, 3.5) -> (236.5, 3.5)
  line L1 (236.5, 3.5) -> (236.5, 5.5)
  line L2 (236.5, 5.5) -> (133.5, 5.5)
  line L3 (133.5, 5.5) -> (133.5, 3.5)
extrude "Extruir90" add sketch "Boceto92" along normal blind 2 separate body makes body 16
move_body "Desplazar55" bodies 16 to x (1, 0, 0) y (0, 1, 0) z (0, 0, 1) at (0, 0, 3)
sketch "Boceto93" plane through (0, 0, 0) normal (0, 0, 1) x (1, 0, 0)
  line L0 (133.5, 34.5) -> (236.5, 34.5)
  line L1 (236.5, 34.5) -> (236.5, 36.5)
  line L2 (236.5, 36.5) -> (133.5, 36.5)
  line L3 (133.5, 36.5) -> (133.5, 34.5)
extrude "Extruir91" add sketch "Boceto93" along normal blind 2 separate body makes body 17
move_body "Desplazar56" bodies 17 to x (1, 0, 0) y (0, 1, 0) z (0, 0, 1) at (0, 0, 3)
sketch "Boceto94" plane through (0, 0, 0) normal (0, 0, 1) x (1, 0, 0)
  line L0 (133.5, 3.5) -> (135.5, 3.5)
  line L1 (135.5, 3.5) -> (135.5, 36.5)
  line L2 (135.5, 36.5) -> (133.5, 36.5)
  line L3 (133.5, 36.5) -> (133.5, 3.5)
extrude "Extruir92" add sketch "Boceto94" along normal blind 2 separate body makes body 18
move_body "Desplazar57" bodies 18 to x (1, 0, 0) y (0, 1, 0) z (0, 0, 1) at (0, 0, 3)
sketch "Boceto95" plane through (0, 0, 0) normal (0, 0, 1) x (1, 0, 0)
  line L0 (234.5, 3.5) -> (236.5, 3.5)
  line L1 (236.5, 3.5) -> (236.5, 36.5)
  line L2 (236.5, 36.5) -> (234.5, 36.5)
  line L3 (234.5, 36.5) -> (234.5, 3.5)
extrude "Extruir93" add sketch "Boceto95" along normal blind 2 separate body makes body 19
move_body "Desplazar58" bodies 19 to x (1, 0, 0) y (0, 1, 0) z (0, 0, 1) at (0, 0, 3)
sketch "Boceto96" plane through (0, 0, 0) normal (0, 0, 1) x (1, 0, 0)
  line L0 (182.5, 17.5) -> (187.5, 17.5)
  line L1 (187.5, 17.5) -> (187.5, 22.5)
  line L2 (187.5, 22.5) -> (182.5, 22.5)
  line L3 (182.5, 22.5) -> (182.5, 17.5)
extrude "Extruir94" cut sketch "Boceto96" along normal blind 5 bodies 15
sketch "Boceto97" plane through (0, 0, 0) normal (0, 0, 1) x (1, 0, 0)
  circle A0 centre (137, 7) radius 1.1
extrude "Extruir95" cut sketch "Boceto97" along normal blind 5 bodies 15
sketch "Boceto98" plane through (0, 0, 0) normal (0, 0, 1) x (1, 0, 0)
  circle A0 centre (233, 7) radius 1.1
extrude "Extruir96" cut sketch "Boceto98" along normal blind 5 bodies 15
sketch "Boceto99" plane through (0, 0, 0) normal (0, 0, 1) x (1, 0, 0)
  circle A0 centre (137, 33) radius 1.1
extrude "Extruir97" cut sketch "Boceto99" along normal blind 5 bodies 15
sketch "Boceto100" plane through (0, 0, 0) normal (0, 0, 1) x (1, 0, 0)
  circle A0 centre (233, 33) radius 1.1
extrude "Extruir98" cut sketch "Boceto100" along normal blind 5 bodies 15
combine "Combinar1" operation add target body 1 tool bodies 2 3 4 5 6 7 8 9 10 11 12 13 14
combine "Combinar2" operation add target body 15 tool bodies 16 17 18 19
